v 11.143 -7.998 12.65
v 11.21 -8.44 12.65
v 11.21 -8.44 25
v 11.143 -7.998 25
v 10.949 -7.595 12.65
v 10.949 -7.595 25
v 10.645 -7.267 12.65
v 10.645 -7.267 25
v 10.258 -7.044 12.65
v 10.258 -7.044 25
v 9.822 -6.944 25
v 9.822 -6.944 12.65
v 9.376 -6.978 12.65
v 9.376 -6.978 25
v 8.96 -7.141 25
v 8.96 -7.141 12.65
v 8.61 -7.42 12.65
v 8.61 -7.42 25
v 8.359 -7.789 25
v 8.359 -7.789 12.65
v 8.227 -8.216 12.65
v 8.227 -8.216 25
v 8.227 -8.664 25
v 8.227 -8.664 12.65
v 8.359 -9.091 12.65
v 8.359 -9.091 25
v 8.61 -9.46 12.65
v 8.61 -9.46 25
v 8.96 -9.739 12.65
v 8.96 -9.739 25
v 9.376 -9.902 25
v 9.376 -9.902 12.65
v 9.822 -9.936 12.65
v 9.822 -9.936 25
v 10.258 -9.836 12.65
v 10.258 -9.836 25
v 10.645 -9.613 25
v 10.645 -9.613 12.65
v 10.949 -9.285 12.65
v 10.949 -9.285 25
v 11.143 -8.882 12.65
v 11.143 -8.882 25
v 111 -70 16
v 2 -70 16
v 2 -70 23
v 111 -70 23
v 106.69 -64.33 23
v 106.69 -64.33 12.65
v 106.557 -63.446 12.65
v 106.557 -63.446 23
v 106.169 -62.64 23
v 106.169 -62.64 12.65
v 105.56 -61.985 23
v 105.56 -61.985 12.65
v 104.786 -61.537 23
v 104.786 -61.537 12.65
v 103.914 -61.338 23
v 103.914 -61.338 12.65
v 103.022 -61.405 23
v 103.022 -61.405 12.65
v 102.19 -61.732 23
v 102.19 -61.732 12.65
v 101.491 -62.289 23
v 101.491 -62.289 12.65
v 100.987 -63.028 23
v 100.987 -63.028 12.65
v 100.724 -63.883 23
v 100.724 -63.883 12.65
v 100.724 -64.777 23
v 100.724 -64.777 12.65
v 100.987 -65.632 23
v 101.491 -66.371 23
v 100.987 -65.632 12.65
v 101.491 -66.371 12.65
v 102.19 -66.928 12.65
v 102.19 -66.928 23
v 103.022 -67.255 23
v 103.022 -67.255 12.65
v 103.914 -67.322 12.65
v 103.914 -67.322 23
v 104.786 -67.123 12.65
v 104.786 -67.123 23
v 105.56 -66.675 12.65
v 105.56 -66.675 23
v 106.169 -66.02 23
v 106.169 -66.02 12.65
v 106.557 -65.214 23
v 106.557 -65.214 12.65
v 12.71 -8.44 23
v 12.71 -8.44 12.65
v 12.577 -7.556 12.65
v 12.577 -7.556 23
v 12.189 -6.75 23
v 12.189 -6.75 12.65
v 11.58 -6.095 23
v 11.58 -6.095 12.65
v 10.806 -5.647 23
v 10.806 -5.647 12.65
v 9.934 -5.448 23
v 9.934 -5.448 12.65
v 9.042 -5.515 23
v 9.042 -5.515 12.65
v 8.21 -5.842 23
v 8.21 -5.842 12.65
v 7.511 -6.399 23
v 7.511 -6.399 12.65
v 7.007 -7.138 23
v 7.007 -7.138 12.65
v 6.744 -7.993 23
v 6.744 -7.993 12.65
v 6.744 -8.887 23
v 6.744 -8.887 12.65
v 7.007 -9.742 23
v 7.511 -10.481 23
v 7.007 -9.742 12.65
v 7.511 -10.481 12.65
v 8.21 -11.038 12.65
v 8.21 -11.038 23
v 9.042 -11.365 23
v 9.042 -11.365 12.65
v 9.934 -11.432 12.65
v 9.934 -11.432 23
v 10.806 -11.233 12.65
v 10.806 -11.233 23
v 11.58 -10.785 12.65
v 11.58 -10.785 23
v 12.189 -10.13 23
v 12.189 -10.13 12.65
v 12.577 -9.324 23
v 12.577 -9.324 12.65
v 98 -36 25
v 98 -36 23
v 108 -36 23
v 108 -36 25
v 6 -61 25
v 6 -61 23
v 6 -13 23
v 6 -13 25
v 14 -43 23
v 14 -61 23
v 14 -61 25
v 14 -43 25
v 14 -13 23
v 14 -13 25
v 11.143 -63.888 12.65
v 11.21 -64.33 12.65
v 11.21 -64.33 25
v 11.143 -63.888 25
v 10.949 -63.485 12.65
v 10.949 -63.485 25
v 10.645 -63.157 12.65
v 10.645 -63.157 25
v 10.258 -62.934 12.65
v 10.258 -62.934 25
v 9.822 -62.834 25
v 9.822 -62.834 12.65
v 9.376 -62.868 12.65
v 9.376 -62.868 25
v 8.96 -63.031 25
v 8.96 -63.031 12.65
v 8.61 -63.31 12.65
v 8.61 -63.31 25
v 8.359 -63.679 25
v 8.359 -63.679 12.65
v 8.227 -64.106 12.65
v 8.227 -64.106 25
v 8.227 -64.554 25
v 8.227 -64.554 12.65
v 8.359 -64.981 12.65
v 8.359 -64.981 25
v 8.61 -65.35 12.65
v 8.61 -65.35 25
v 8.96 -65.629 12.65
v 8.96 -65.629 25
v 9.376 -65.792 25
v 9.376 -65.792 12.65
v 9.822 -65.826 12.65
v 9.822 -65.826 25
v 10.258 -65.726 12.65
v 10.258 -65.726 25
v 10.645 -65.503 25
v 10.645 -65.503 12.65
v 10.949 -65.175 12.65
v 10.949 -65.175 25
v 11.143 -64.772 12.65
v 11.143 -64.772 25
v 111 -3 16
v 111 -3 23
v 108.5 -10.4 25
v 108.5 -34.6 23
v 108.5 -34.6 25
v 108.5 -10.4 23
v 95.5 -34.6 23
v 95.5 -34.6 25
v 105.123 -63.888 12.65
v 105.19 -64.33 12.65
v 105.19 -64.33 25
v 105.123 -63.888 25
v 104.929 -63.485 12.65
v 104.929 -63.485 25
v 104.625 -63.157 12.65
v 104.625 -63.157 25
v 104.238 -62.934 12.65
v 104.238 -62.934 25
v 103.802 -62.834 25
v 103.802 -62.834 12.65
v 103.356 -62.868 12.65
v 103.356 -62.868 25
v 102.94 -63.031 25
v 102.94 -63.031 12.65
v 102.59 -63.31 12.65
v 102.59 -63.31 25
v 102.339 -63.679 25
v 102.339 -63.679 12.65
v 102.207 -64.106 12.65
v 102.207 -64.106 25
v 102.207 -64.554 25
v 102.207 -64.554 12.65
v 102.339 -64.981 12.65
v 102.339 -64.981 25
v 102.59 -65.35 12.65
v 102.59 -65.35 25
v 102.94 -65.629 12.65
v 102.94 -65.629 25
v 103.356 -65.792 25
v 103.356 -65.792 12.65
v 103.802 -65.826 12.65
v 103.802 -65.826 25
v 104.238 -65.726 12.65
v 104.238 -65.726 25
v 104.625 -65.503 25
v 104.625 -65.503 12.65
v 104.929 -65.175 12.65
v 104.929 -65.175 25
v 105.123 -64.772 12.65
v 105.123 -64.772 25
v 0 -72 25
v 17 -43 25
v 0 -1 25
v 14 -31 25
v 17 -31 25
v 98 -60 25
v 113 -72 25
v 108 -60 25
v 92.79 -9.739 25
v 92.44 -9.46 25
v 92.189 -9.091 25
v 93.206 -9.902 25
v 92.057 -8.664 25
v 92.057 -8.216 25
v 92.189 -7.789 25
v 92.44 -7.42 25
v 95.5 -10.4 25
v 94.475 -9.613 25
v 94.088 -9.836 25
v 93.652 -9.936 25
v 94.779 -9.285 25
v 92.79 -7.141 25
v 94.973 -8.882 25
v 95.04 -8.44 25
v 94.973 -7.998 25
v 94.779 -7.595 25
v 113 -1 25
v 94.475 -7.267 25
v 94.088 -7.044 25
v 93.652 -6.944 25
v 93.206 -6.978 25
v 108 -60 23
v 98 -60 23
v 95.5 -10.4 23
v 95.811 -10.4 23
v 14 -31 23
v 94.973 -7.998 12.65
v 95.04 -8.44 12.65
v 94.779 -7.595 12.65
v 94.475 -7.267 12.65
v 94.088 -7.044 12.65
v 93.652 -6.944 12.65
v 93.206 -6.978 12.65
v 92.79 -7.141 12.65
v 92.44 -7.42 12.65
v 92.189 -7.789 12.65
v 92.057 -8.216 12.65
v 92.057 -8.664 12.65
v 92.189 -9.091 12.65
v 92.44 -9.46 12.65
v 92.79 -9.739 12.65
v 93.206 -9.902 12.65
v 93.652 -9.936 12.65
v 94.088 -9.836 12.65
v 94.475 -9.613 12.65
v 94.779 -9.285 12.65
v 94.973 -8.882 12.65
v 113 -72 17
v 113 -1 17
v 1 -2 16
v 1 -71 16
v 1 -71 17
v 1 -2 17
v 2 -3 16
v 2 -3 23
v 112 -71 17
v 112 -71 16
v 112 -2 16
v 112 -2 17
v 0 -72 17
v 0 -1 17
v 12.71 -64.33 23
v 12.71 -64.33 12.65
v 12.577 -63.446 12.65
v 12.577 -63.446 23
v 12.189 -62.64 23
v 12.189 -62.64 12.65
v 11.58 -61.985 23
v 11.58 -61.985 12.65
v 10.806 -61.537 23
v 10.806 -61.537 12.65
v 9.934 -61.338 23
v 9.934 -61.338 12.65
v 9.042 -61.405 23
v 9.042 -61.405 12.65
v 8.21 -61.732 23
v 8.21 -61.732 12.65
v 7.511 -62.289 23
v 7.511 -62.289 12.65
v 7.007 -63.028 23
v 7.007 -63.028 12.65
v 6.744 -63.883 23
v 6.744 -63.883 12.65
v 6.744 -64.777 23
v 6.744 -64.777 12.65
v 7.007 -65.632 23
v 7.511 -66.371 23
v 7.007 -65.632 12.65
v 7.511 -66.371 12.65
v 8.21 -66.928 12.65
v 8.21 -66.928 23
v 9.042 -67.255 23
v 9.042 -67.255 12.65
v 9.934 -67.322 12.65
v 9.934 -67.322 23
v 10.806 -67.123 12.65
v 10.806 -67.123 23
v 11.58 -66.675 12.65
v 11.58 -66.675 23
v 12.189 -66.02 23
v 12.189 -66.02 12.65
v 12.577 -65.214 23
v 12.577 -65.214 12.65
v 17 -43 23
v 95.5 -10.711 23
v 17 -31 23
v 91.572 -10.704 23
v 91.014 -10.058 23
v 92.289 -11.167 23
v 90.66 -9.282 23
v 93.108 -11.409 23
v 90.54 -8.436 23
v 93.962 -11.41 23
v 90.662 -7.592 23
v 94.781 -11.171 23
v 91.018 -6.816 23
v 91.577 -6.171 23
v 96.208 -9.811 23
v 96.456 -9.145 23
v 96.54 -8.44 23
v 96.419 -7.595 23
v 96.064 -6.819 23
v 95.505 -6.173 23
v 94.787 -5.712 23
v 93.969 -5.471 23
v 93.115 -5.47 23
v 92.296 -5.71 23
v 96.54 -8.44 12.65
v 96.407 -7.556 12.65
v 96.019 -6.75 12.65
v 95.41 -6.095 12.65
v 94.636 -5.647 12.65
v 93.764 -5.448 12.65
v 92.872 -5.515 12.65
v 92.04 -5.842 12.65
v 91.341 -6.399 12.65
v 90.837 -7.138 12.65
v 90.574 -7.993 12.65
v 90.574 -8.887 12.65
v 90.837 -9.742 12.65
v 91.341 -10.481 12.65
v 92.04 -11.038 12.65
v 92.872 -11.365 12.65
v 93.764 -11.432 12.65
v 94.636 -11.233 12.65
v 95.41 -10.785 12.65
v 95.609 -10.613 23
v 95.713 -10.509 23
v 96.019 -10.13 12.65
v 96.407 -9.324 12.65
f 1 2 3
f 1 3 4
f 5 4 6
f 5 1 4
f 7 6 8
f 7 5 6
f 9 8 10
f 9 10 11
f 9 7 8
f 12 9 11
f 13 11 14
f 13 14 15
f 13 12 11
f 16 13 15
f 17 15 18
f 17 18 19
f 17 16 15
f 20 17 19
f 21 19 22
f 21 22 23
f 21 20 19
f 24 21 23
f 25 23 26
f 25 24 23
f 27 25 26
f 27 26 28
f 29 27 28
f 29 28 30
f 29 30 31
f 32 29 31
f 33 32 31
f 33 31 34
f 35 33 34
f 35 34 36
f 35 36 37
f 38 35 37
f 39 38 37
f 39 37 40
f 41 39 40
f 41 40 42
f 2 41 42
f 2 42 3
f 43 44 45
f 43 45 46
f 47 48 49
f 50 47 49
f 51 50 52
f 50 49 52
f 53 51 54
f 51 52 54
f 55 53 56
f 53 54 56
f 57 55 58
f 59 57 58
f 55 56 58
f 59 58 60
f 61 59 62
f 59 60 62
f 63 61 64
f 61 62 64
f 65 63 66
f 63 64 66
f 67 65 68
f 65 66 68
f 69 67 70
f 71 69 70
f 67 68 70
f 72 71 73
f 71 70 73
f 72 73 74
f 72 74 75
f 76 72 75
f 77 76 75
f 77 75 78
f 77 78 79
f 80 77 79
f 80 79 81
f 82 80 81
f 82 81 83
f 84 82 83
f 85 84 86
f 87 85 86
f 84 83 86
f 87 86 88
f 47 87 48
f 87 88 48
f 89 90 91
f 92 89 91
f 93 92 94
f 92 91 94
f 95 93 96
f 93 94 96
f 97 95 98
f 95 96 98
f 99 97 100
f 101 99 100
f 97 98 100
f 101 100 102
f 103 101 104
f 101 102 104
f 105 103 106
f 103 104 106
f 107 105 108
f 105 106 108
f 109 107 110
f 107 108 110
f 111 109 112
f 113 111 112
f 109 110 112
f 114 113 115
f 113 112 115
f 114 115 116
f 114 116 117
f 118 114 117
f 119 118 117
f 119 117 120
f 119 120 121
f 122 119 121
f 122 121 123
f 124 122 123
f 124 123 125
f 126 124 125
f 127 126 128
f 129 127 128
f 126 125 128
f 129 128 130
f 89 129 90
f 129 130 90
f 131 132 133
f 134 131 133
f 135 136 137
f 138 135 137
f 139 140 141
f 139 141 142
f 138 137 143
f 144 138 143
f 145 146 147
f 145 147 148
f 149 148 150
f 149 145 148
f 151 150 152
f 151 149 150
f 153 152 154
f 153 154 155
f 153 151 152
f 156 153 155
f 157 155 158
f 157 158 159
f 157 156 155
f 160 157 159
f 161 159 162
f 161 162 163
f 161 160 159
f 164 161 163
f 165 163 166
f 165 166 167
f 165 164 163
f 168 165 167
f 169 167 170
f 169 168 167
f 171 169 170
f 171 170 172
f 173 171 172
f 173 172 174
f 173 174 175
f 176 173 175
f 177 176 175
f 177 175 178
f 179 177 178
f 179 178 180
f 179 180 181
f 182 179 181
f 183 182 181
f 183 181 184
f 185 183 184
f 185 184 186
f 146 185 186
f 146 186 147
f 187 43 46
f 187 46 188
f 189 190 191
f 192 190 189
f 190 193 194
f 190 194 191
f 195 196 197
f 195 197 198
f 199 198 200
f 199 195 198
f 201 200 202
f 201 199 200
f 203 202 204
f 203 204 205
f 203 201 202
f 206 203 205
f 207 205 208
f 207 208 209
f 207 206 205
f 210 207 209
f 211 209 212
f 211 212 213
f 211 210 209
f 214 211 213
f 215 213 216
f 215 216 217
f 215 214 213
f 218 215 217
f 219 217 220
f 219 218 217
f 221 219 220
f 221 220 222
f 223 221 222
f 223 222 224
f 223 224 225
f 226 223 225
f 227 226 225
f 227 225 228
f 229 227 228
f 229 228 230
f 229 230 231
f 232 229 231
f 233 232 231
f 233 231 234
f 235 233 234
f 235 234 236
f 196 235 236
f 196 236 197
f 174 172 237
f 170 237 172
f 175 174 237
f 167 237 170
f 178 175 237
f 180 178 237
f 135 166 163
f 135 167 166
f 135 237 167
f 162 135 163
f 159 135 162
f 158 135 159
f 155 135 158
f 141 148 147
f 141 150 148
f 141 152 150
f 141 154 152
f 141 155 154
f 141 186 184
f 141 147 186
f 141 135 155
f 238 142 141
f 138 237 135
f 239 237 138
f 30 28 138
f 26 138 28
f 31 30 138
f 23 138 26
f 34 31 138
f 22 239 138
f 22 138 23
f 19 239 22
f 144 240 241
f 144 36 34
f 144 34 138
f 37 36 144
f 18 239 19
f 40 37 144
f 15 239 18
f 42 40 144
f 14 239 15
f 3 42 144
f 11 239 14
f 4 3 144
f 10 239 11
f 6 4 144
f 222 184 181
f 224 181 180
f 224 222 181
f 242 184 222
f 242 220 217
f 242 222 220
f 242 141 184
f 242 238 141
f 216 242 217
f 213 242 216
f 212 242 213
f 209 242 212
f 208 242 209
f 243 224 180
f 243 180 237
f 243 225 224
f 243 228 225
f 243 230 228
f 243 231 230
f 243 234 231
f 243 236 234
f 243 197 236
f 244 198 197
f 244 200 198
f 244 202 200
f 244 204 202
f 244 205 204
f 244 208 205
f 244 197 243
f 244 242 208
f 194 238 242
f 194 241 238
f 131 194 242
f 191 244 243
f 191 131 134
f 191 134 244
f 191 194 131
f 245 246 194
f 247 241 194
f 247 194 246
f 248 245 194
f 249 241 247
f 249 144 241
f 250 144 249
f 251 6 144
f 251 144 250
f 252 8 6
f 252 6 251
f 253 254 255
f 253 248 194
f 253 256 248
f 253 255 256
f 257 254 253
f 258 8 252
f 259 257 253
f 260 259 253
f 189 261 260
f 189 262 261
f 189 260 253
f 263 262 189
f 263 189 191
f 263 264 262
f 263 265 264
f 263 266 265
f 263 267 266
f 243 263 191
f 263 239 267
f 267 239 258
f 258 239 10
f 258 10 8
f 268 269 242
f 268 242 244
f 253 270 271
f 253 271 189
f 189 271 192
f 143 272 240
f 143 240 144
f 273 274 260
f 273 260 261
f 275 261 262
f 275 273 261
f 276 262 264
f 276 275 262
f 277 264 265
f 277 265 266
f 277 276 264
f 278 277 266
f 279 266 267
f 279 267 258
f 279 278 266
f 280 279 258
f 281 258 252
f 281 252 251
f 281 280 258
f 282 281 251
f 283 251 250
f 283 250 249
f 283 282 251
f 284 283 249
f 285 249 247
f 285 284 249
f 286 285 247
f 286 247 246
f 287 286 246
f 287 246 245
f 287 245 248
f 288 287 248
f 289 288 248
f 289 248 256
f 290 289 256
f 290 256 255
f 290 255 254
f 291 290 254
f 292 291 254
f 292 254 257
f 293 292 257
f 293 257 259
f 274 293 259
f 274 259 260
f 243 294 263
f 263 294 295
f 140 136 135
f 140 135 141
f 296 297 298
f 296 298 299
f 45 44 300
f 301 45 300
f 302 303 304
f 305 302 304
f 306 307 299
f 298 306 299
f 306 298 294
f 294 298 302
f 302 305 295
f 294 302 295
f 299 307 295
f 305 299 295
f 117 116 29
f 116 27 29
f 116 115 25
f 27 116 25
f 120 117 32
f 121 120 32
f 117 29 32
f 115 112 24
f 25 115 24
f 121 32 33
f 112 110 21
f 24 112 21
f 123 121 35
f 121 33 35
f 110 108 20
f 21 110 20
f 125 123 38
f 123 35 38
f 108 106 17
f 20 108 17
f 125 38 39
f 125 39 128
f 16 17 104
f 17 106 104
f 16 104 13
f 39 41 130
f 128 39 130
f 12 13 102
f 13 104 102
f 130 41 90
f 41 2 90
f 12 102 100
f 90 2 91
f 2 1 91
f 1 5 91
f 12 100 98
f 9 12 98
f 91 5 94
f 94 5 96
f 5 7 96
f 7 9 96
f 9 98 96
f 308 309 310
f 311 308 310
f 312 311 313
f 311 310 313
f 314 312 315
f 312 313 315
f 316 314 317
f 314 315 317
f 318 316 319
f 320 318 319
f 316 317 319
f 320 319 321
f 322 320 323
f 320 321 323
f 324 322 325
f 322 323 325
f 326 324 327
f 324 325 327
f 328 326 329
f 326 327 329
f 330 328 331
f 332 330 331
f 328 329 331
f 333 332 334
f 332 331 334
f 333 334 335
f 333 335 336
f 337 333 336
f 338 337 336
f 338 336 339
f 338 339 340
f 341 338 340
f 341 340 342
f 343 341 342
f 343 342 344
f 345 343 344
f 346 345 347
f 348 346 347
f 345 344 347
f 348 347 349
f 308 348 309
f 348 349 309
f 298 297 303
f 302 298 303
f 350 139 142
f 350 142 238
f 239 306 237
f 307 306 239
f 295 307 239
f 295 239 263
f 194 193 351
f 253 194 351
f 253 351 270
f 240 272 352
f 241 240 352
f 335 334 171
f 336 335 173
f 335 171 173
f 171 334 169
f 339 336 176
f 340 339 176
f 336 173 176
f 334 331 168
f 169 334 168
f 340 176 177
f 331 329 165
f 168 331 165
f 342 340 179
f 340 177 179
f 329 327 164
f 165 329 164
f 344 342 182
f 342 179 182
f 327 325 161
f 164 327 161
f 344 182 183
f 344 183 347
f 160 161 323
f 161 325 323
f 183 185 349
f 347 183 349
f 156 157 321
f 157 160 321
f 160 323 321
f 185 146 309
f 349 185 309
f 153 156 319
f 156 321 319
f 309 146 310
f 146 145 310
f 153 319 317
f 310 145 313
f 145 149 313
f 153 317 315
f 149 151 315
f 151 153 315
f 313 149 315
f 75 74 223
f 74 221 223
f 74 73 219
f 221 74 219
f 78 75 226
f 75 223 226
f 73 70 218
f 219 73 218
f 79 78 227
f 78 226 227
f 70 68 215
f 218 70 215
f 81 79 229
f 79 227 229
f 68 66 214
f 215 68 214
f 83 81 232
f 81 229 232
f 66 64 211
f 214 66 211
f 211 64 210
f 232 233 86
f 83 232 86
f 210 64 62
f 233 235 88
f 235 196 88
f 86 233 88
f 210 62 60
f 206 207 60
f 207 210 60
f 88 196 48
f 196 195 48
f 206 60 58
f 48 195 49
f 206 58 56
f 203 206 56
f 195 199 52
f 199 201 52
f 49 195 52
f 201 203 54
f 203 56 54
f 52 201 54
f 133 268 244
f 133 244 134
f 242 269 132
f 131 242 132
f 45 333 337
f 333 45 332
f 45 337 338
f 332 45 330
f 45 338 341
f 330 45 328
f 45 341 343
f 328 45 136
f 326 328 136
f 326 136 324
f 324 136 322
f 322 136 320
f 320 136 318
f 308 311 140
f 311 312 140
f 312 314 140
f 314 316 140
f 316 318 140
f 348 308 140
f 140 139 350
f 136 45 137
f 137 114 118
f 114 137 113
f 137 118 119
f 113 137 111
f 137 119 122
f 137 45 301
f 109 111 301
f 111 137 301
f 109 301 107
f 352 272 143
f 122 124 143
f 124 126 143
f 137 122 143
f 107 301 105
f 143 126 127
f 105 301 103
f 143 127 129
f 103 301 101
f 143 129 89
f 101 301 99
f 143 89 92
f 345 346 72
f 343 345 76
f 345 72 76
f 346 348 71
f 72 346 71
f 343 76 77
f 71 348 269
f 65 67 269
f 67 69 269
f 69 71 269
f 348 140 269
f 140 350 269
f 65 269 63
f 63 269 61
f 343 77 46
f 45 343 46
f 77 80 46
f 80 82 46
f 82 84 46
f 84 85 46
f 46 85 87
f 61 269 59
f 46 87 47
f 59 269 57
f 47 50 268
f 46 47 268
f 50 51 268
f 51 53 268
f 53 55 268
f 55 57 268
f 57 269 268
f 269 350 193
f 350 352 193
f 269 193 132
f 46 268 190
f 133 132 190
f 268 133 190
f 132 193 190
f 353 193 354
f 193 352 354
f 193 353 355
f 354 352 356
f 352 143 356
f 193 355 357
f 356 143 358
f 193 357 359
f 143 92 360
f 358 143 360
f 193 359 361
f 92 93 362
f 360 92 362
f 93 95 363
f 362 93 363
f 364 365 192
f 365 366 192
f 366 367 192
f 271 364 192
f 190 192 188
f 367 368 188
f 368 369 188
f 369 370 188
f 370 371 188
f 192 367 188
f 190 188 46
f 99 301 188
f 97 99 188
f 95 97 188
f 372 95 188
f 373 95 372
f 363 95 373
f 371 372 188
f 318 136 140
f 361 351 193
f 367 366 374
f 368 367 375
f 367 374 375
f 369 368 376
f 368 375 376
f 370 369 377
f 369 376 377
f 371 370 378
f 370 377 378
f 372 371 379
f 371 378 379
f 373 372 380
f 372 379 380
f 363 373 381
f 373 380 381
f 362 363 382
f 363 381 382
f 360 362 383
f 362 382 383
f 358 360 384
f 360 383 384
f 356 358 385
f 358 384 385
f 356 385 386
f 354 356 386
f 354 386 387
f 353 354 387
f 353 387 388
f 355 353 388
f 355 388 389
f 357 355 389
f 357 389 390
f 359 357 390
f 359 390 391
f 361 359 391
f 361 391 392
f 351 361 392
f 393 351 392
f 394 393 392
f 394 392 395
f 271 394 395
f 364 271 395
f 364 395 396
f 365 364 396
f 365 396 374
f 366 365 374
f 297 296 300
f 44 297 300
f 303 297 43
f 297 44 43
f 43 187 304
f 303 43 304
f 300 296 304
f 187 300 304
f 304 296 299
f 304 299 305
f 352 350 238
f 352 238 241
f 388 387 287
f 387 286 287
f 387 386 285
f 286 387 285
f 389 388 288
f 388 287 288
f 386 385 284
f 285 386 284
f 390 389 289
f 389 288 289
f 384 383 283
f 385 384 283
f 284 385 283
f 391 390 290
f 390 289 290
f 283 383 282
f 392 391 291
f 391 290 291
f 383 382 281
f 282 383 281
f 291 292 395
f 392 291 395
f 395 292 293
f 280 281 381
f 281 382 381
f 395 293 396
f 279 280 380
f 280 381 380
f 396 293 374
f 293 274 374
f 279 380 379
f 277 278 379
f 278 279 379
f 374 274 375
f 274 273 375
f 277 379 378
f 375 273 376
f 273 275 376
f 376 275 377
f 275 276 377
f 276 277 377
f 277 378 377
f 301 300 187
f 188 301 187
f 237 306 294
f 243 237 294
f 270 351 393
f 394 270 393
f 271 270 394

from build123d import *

# Parameters (mm, degrees)
TUBE004_R         = 3
TUBE004_R_2       = 1.5
TUBE004_DEPTH     = 10.35
TUBE002_R         = 3
TUBE002_R_2       = 1.5
TUBE002_DEPTH     = 10.35
TUBE001_R         = 3
TUBE001_R_2       = 1.5
TUBE001_DEPTH     = 10.35
TUBE_R            = 3
TUBE_R_2          = 1.5
TUBE_DEPTH        = 10.35
CYLINDER007_R     = 1.5
CYLINDER007_DEPTH = 2
CYLINDER006_R     = 1.5
CYLINDER006_DEPTH = 2
CYLINDER005_R     = 1.5
CYLINDER005_DEPTH = 2
CYLINDER004_R     = 1.5
CYLINDER004_DEPTH = 2
BOX012_W          = 1
BOX012_H          = 1
BOX012_DEPTH      = 1
BOX011_W          = 13
BOX011_H          = 24.2
BOX011_DEPTH      = 10
BOX010_W          = 10
BOX010_H          = 24
BOX010_DEPTH      = 10
BOX009_W          = 5
BOX009_H          = 12
BOX009_DEPTH      = 10
BOX008_W          = 8
BOX008_H          = 48
BOX008_DEPTH      = 10
BOX007_W          = 109
BOX007_H          = 67
BOX007_DEPTH      = 1
BOX006_W          = 111
BOX006_H          = 69
BOX006_DEPTH      = 1
BOX005_W          = 109
BOX005_H          = 67
BOX005_DEPTH      = 6
BOX004_W          = 113
BOX004_H          = 71
BOX004_DEPTH      = 8


with BuildPart() as pusher_ru:
    # Tube004 → Tube004 (new body)
    with BuildSketch(Plane(origin=(103.69, -64.33, -0.35), x_dir=(1, 0, 0), z_dir=(0, 0, 1))):
        Circle(TUBE004_R)
        Circle(TUBE004_R_2, mode=Mode.SUBTRACT)
    extrude(amount=TUBE004_DEPTH)


with BuildPart() as pusher_ro:
    # Tube002 → Tube002 (new body)
    with BuildSketch(Plane(origin=(93.54, -8.44, -0.35), x_dir=(1, 0, 0), z_dir=(0, 0, 1))):
        Circle(TUBE002_R)
        Circle(TUBE002_R_2, mode=Mode.SUBTRACT)
    extrude(amount=TUBE002_DEPTH)


with BuildPart() as pusher_lu:
    # Tube001 → Tube001 (new body)
    with BuildSketch(Plane(origin=(9.71, -64.33, -0.35), x_dir=(1, 0, 0), z_dir=(0, 0, 1))):
        Circle(TUBE001_R)
        Circle(TUBE001_R_2, mode=Mode.SUBTRACT)
    extrude(amount=TUBE001_DEPTH)


with BuildPart() as pusher_lo:
    # Tube → Tube (new body)
    with BuildSketch(Plane(origin=(9.71, -8.44, -0.35), x_dir=(1, 0, 0), z_dir=(0, 0, 1))):
        Circle(TUBE_R)
        Circle(TUBE_R_2, mode=Mode.SUBTRACT)
    extrude(amount=TUBE_DEPTH)


with BuildPart() as hole_ru:
    # Cylinder007 → Cylinder007 (new body)
    with BuildSketch(Plane(origin=(103.69, -64.33, 10), x_dir=(1, 0, 0), z_dir=(0, 0, 1))):
        Circle(CYLINDER007_R)
    extrude(amount=CYLINDER007_DEPTH)


with BuildPart() as hole_ro:
    # Cylinder006 → Cylinder006 (new body)
    with BuildSketch(Plane(origin=(93.54, -8.44, 10), x_dir=(1, 0, 0), z_dir=(0, 0, 1))):
        Circle(CYLINDER006_R)
    extrude(amount=CYLINDER006_DEPTH)


with BuildPart() as hole_lu:
    # Cylinder005 → Cylinder005 (new body)
    with BuildSketch(Plane(origin=(9.71, -64.33, 10), x_dir=(1, 0, 0), z_dir=(0, 0, 1))):
        Circle(CYLINDER005_R)
    extrude(amount=CYLINDER005_DEPTH)


with BuildPart() as hole_lo:
    # Cylinder004 → Cylinder004 (new body)
    with BuildSketch(Plane(origin=(9.71, -8.44, 10), x_dir=(1, 0, 0), z_dir=(0, 0, 1))):
        Circle(CYLINDER004_R)
    extrude(amount=CYLINDER004_DEPTH)


with BuildPart() as supply_cut:
    # Box012 → Box012 (new body)
    with BuildSketch(Plane(origin=(86, -70, 9), x_dir=(1, 0, 0), z_dir=(0, 0, 1))):
        with Locations((0.5, 0.5)):
            Rectangle(BOX012_W, BOX012_H)
    extrude(amount=BOX012_DEPTH)


with BuildPart() as phoenix_cut:
    # Box011 → Box011 (new body)
    with BuildSketch(Plane(origin=(95.5, -34.6, 3), x_dir=(1, 0, 0), z_dir=(0, 0, 1))):
        with Locations((6.5, 12.1)):
            Rectangle(BOX011_W, BOX011_H)
    extrude(amount=BOX011_DEPTH)


with BuildPart() as molex8_cut:
    # Box010 → Box010 (new body)
    with BuildSketch(Plane(origin=(98, -60, 3), x_dir=(1, 0, 0), z_dir=(0, 0, 1))):
        with Locations((5, 12)):
            Rectangle(BOX010_W, BOX010_H)
    extrude(amount=BOX010_DEPTH)


with BuildPart() as box009:
    # Box009 → Box009 (new body)
    with BuildSketch(Plane(origin=(12, -43, 6), x_dir=(1, 0, 0), z_dir=(0, 0, 1))):
        with Locations((2.5, 6)):
            Rectangle(BOX009_W, BOX009_H)
    extrude(amount=BOX009_DEPTH)


with BuildPart() as box008:
    # Box008 → Box008 (new body)
    with BuildSketch(Plane(origin=(6, -61, 6), x_dir=(1, 0, 0), z_dir=(0, 0, 1))):
        with Locations((4, 24)):
            Rectangle(BOX008_W, BOX008_H)
    extrude(amount=BOX008_DEPTH)


with BuildPart() as casebottomlip_in001:
    # Box007 → Box007 (new body)
    with BuildSketch(Plane(origin=(2, -70, -13), x_dir=(1, 0, 0), z_dir=(0, 0, 1))):
        with Locations((54.5, 33.5)):
            Rectangle(BOX007_W, BOX007_H)
    extrude(amount=BOX007_DEPTH)


with BuildPart() as casetoplip:
    # Box006 → Box006 (new body)
    with BuildSketch(Plane(origin=(1, -71, -13), x_dir=(1, 0, 0), z_dir=(0, 0, 1))):
        with Locations((55.5, 34.5)):
            Rectangle(BOX006_W, BOX006_H)
    extrude(amount=BOX006_DEPTH)

    # Cut003: cut CaseBottomLip_In001
    add(casebottomlip_in001.part, mode=Mode.SUBTRACT)


with BuildPart() as casetopbed_in:
    # Box005 → Box005 (new body)
    with BuildSketch(Plane(origin=(2, -70, -12), x_dir=(1, 0, 0), z_dir=(0, 0, 1))):
        with Locations((54.5, 33.5)):
            Rectangle(BOX005_W, BOX005_H)
    extrude(amount=BOX005_DEPTH)


with BuildPart() as casetop:
    # Box004 → Box004 (new body)
    with BuildSketch(Plane(origin=(0, -72, -12), x_dir=(1, 0, 0), z_dir=(0, 0, 1))):
        with Locations((56.5, 35.5)):
            Rectangle(BOX004_W, BOX004_H)
    extrude(amount=BOX004_DEPTH)

    # Cut002: cut CaseTopBed_In
    add(casetopbed_in.part, mode=Mode.SUBTRACT)

    # Fusion001: union CaseTopLip
    add(casetoplip.part)


with BuildPart() as casetop_1:
    # Fusion001 placement: moved
    add(casetop.part.moved(Location((0, 0, 16))))

    # Cut004: cut Box008
    add(box008.part, mode=Mode.SUBTRACT)

    # Cut005: cut Box009
    add(box009.part, mode=Mode.SUBTRACT)

    # Cut006: cut Molex8_Cut
    add(molex8_cut.part, mode=Mode.SUBTRACT)

    # Cut007: cut Phoenix_Cut
    add(phoenix_cut.part, mode=Mode.SUBTRACT)

    # Cut008: cut Supply_Cut
    add(supply_cut.part, mode=Mode.SUBTRACT)

    # Cut013: cut Hole_LO
    add(hole_lo.part, mode=Mode.SUBTRACT)

    # Cut014: cut Hole_LU
    add(hole_lu.part, mode=Mode.SUBTRACT)

    # Cut015: cut Hole_RO
    add(hole_ro.part, mode=Mode.SUBTRACT)

    # Cut016: cut Hole_RU
    add(hole_ru.part, mode=Mode.SUBTRACT)

    # Fusion006: union Pusher_LO
    add(pusher_lo.part)

    # Fusion007: union Pusher_LU
    add(pusher_lu.part)

    # Fusion008: union Pusher_RO
    add(pusher_ro.part)

    # Fusion009: union Pusher_RU
    add(pusher_ru.part)


with BuildPart() as casetop_2:
    # Fusion009 placement: moved
    add(casetop_1.part.moved(Location((0, 0, 13))))


solid = casetop_2.part
